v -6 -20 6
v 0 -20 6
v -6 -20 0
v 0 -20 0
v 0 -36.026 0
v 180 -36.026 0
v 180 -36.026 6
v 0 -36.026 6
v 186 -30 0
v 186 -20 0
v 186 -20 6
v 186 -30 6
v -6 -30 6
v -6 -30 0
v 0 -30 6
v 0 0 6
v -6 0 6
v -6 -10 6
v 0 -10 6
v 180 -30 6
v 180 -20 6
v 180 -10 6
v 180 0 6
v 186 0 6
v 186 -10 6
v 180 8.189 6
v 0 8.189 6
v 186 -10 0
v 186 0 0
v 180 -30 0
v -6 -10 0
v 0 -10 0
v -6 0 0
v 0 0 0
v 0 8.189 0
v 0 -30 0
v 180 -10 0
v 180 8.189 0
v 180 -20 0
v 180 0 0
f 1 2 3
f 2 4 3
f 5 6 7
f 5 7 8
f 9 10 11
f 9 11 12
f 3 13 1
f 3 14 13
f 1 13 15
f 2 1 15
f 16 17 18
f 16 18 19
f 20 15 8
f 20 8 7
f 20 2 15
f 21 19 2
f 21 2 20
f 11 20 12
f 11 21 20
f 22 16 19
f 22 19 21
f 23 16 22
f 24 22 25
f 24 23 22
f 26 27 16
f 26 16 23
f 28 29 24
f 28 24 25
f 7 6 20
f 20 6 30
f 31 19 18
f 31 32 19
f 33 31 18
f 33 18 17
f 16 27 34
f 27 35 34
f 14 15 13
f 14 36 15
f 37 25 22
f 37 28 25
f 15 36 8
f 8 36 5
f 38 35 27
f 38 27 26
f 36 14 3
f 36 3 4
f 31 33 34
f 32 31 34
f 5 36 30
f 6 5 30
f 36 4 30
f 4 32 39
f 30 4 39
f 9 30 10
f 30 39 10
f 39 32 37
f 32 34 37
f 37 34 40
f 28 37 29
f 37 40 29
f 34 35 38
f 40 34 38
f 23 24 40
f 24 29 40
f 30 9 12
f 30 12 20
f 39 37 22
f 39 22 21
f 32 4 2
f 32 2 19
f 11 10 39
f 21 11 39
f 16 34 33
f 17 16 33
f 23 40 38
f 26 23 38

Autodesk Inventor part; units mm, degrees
ref_plane "YZ Plane" through (0, 0, 0) normal (1, 0, 0) x (0, 1, 0)
ref_plane "XZ Plane" through (0, 0, 0) normal (0, 1, 0) x (-1, 0, 0)
ref_plane "XY Plane" through (0, 0, 0) normal (0, 0, 1) x (1, 0, 0)
sketch "Эскиз1" plane through (0, 0, 0) normal (0, 0, 1) x (1, 0, 0)
  line L0 (0, 0) -> (0, -10) projected
  line L1 (0, 0) -> (-6, 0) projected
  line L2 (-6, -10) -> (-6, 0) projected
  line L3 (0, -10) -> (-6, -10) projected
  line L4 (0, -20) -> (0, -30) projected
  line L5 (0, -20) -> (-6, -20) projected
  line L6 (-6, -30) -> (-6, -20) projected
  line L7 (0, -30) -> (-6, -30) projected
  line L8 (0, -30) -> (0, -36.0265) projected
  line L9 (0, 8.1888) -> (0, 0) projected
  line L10 (186, -20) -> (186, -30) projected
  line L11 (186, -20) -> (180, -20) projected
  line L12 (180, -30) -> (180, -20) projected
  line L13 (186, -30) -> (180, -30) projected
  line L14 (186, 0) -> (186, -10) projected
  line L15 (186, 0) -> (180, 0) projected
  line L16 (180, -10) -> (180, 0) projected
  line L17 (186, -10) -> (180, -10) projected
  line L18 (180, -36.0265) -> (180, -30) projected
  line L19 (180, 0) -> (180, 8.1888) projected
  line L20 (0, 8.1888) -> (180, 8.1888)
  line L21 (180, 8.1888) -> (180, -36.0265)
  line L22 (180, -36.0265) -> (0, -36.0265)
  line L23 (0, -36.0265) -> (0, 8.1888)
extrude "Выдавливание1" add sketch "Эскиз1" along normal blind 6
properties part number "маленькое дно1"
